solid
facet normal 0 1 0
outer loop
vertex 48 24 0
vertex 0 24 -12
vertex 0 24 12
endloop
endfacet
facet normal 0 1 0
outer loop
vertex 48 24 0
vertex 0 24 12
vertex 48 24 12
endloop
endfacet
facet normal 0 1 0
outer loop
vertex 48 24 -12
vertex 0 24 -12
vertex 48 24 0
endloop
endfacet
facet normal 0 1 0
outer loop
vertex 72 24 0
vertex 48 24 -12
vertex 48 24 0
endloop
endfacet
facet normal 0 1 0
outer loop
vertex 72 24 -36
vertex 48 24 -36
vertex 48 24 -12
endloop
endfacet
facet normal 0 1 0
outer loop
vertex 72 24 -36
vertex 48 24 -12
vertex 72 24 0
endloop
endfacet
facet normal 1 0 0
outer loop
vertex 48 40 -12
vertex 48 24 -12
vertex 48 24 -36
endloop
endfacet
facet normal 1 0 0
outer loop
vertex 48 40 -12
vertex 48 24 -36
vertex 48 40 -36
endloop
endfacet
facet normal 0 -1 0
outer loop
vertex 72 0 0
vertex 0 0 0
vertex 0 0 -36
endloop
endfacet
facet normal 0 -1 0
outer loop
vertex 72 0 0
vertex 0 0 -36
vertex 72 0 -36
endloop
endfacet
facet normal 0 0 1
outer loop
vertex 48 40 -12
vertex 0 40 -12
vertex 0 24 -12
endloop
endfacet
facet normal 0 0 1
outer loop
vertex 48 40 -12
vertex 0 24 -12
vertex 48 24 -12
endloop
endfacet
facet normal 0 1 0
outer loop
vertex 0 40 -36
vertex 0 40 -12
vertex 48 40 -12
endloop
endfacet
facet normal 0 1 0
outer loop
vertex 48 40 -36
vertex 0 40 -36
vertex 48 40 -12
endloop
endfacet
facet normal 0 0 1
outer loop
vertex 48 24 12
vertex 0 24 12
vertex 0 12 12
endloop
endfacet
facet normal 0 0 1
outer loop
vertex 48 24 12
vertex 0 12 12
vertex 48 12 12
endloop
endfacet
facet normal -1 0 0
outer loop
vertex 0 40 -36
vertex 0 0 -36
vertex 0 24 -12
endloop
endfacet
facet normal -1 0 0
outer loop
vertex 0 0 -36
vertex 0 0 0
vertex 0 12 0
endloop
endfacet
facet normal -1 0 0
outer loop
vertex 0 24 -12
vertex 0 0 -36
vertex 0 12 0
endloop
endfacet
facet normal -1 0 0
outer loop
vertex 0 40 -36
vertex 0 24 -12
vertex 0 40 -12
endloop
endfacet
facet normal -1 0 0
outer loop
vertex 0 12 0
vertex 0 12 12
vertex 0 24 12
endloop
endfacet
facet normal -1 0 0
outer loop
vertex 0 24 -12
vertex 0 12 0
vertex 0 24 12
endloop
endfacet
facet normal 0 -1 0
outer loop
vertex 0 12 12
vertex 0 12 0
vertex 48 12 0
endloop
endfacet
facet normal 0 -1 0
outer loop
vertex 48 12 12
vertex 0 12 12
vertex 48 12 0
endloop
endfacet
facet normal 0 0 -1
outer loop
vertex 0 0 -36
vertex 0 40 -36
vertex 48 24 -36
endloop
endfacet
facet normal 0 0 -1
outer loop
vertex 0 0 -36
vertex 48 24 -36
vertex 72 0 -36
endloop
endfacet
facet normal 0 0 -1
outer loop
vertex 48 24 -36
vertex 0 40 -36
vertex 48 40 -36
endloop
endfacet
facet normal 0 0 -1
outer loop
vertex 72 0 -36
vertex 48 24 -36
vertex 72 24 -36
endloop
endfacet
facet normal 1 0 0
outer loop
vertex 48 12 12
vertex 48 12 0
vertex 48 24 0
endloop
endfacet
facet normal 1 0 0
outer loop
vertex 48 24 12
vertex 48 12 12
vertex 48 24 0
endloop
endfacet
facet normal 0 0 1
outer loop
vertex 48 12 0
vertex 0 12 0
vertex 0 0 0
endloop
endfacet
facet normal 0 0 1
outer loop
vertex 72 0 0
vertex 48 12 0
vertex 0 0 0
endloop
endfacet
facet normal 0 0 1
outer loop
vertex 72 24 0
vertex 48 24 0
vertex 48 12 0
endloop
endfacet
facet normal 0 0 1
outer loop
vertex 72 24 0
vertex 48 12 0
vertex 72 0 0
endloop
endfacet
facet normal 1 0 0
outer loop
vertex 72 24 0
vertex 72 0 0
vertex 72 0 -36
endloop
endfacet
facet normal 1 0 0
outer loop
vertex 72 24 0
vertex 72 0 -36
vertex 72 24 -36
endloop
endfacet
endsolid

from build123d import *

# Parameters (mm, degrees)
SKETCH1_W           = 72
SKETCH1_H           = 24
BOSS_EXTRUDE1_DEPTH = 36
SKETCH1_3_W         = 48
SKETCH1_3_H         = 12
BOSS_EXTRUDE2_DEPTH = 12
BOSS_EXTRUDE4_START = -12
SKETCH1_5_W         = 48
SKETCH1_5_H         = 16
BOSS_EXTRUDE4_DEPTH = 24


with BuildPart() as part:
    # Sketch1 → Boss-Extrude1 (new body)
    with BuildSketch(Plane.XY):
        with Locations((36, 12)):
            Rectangle(SKETCH1_W, SKETCH1_H)
    extrude(amount=-BOSS_EXTRUDE1_DEPTH)

    # Sketch1<3> → Boss-Extrude2 (add)
    with BuildSketch(Plane.XY):
        with Locations((24, 18)):
            Rectangle(SKETCH1_3_W, SKETCH1_3_H)
    extrude(amount=BOSS_EXTRUDE2_DEPTH)

    # Sketch1<5> → Boss-Extrude4 (add)
    with BuildSketch(Plane.XY.offset(BOSS_EXTRUDE4_START)):
        with Locations((24, 32)):
            Rectangle(SKETCH1_5_W, SKETCH1_5_H)
    extrude(amount=-BOSS_EXTRUDE4_DEPTH)


solid = part.part
